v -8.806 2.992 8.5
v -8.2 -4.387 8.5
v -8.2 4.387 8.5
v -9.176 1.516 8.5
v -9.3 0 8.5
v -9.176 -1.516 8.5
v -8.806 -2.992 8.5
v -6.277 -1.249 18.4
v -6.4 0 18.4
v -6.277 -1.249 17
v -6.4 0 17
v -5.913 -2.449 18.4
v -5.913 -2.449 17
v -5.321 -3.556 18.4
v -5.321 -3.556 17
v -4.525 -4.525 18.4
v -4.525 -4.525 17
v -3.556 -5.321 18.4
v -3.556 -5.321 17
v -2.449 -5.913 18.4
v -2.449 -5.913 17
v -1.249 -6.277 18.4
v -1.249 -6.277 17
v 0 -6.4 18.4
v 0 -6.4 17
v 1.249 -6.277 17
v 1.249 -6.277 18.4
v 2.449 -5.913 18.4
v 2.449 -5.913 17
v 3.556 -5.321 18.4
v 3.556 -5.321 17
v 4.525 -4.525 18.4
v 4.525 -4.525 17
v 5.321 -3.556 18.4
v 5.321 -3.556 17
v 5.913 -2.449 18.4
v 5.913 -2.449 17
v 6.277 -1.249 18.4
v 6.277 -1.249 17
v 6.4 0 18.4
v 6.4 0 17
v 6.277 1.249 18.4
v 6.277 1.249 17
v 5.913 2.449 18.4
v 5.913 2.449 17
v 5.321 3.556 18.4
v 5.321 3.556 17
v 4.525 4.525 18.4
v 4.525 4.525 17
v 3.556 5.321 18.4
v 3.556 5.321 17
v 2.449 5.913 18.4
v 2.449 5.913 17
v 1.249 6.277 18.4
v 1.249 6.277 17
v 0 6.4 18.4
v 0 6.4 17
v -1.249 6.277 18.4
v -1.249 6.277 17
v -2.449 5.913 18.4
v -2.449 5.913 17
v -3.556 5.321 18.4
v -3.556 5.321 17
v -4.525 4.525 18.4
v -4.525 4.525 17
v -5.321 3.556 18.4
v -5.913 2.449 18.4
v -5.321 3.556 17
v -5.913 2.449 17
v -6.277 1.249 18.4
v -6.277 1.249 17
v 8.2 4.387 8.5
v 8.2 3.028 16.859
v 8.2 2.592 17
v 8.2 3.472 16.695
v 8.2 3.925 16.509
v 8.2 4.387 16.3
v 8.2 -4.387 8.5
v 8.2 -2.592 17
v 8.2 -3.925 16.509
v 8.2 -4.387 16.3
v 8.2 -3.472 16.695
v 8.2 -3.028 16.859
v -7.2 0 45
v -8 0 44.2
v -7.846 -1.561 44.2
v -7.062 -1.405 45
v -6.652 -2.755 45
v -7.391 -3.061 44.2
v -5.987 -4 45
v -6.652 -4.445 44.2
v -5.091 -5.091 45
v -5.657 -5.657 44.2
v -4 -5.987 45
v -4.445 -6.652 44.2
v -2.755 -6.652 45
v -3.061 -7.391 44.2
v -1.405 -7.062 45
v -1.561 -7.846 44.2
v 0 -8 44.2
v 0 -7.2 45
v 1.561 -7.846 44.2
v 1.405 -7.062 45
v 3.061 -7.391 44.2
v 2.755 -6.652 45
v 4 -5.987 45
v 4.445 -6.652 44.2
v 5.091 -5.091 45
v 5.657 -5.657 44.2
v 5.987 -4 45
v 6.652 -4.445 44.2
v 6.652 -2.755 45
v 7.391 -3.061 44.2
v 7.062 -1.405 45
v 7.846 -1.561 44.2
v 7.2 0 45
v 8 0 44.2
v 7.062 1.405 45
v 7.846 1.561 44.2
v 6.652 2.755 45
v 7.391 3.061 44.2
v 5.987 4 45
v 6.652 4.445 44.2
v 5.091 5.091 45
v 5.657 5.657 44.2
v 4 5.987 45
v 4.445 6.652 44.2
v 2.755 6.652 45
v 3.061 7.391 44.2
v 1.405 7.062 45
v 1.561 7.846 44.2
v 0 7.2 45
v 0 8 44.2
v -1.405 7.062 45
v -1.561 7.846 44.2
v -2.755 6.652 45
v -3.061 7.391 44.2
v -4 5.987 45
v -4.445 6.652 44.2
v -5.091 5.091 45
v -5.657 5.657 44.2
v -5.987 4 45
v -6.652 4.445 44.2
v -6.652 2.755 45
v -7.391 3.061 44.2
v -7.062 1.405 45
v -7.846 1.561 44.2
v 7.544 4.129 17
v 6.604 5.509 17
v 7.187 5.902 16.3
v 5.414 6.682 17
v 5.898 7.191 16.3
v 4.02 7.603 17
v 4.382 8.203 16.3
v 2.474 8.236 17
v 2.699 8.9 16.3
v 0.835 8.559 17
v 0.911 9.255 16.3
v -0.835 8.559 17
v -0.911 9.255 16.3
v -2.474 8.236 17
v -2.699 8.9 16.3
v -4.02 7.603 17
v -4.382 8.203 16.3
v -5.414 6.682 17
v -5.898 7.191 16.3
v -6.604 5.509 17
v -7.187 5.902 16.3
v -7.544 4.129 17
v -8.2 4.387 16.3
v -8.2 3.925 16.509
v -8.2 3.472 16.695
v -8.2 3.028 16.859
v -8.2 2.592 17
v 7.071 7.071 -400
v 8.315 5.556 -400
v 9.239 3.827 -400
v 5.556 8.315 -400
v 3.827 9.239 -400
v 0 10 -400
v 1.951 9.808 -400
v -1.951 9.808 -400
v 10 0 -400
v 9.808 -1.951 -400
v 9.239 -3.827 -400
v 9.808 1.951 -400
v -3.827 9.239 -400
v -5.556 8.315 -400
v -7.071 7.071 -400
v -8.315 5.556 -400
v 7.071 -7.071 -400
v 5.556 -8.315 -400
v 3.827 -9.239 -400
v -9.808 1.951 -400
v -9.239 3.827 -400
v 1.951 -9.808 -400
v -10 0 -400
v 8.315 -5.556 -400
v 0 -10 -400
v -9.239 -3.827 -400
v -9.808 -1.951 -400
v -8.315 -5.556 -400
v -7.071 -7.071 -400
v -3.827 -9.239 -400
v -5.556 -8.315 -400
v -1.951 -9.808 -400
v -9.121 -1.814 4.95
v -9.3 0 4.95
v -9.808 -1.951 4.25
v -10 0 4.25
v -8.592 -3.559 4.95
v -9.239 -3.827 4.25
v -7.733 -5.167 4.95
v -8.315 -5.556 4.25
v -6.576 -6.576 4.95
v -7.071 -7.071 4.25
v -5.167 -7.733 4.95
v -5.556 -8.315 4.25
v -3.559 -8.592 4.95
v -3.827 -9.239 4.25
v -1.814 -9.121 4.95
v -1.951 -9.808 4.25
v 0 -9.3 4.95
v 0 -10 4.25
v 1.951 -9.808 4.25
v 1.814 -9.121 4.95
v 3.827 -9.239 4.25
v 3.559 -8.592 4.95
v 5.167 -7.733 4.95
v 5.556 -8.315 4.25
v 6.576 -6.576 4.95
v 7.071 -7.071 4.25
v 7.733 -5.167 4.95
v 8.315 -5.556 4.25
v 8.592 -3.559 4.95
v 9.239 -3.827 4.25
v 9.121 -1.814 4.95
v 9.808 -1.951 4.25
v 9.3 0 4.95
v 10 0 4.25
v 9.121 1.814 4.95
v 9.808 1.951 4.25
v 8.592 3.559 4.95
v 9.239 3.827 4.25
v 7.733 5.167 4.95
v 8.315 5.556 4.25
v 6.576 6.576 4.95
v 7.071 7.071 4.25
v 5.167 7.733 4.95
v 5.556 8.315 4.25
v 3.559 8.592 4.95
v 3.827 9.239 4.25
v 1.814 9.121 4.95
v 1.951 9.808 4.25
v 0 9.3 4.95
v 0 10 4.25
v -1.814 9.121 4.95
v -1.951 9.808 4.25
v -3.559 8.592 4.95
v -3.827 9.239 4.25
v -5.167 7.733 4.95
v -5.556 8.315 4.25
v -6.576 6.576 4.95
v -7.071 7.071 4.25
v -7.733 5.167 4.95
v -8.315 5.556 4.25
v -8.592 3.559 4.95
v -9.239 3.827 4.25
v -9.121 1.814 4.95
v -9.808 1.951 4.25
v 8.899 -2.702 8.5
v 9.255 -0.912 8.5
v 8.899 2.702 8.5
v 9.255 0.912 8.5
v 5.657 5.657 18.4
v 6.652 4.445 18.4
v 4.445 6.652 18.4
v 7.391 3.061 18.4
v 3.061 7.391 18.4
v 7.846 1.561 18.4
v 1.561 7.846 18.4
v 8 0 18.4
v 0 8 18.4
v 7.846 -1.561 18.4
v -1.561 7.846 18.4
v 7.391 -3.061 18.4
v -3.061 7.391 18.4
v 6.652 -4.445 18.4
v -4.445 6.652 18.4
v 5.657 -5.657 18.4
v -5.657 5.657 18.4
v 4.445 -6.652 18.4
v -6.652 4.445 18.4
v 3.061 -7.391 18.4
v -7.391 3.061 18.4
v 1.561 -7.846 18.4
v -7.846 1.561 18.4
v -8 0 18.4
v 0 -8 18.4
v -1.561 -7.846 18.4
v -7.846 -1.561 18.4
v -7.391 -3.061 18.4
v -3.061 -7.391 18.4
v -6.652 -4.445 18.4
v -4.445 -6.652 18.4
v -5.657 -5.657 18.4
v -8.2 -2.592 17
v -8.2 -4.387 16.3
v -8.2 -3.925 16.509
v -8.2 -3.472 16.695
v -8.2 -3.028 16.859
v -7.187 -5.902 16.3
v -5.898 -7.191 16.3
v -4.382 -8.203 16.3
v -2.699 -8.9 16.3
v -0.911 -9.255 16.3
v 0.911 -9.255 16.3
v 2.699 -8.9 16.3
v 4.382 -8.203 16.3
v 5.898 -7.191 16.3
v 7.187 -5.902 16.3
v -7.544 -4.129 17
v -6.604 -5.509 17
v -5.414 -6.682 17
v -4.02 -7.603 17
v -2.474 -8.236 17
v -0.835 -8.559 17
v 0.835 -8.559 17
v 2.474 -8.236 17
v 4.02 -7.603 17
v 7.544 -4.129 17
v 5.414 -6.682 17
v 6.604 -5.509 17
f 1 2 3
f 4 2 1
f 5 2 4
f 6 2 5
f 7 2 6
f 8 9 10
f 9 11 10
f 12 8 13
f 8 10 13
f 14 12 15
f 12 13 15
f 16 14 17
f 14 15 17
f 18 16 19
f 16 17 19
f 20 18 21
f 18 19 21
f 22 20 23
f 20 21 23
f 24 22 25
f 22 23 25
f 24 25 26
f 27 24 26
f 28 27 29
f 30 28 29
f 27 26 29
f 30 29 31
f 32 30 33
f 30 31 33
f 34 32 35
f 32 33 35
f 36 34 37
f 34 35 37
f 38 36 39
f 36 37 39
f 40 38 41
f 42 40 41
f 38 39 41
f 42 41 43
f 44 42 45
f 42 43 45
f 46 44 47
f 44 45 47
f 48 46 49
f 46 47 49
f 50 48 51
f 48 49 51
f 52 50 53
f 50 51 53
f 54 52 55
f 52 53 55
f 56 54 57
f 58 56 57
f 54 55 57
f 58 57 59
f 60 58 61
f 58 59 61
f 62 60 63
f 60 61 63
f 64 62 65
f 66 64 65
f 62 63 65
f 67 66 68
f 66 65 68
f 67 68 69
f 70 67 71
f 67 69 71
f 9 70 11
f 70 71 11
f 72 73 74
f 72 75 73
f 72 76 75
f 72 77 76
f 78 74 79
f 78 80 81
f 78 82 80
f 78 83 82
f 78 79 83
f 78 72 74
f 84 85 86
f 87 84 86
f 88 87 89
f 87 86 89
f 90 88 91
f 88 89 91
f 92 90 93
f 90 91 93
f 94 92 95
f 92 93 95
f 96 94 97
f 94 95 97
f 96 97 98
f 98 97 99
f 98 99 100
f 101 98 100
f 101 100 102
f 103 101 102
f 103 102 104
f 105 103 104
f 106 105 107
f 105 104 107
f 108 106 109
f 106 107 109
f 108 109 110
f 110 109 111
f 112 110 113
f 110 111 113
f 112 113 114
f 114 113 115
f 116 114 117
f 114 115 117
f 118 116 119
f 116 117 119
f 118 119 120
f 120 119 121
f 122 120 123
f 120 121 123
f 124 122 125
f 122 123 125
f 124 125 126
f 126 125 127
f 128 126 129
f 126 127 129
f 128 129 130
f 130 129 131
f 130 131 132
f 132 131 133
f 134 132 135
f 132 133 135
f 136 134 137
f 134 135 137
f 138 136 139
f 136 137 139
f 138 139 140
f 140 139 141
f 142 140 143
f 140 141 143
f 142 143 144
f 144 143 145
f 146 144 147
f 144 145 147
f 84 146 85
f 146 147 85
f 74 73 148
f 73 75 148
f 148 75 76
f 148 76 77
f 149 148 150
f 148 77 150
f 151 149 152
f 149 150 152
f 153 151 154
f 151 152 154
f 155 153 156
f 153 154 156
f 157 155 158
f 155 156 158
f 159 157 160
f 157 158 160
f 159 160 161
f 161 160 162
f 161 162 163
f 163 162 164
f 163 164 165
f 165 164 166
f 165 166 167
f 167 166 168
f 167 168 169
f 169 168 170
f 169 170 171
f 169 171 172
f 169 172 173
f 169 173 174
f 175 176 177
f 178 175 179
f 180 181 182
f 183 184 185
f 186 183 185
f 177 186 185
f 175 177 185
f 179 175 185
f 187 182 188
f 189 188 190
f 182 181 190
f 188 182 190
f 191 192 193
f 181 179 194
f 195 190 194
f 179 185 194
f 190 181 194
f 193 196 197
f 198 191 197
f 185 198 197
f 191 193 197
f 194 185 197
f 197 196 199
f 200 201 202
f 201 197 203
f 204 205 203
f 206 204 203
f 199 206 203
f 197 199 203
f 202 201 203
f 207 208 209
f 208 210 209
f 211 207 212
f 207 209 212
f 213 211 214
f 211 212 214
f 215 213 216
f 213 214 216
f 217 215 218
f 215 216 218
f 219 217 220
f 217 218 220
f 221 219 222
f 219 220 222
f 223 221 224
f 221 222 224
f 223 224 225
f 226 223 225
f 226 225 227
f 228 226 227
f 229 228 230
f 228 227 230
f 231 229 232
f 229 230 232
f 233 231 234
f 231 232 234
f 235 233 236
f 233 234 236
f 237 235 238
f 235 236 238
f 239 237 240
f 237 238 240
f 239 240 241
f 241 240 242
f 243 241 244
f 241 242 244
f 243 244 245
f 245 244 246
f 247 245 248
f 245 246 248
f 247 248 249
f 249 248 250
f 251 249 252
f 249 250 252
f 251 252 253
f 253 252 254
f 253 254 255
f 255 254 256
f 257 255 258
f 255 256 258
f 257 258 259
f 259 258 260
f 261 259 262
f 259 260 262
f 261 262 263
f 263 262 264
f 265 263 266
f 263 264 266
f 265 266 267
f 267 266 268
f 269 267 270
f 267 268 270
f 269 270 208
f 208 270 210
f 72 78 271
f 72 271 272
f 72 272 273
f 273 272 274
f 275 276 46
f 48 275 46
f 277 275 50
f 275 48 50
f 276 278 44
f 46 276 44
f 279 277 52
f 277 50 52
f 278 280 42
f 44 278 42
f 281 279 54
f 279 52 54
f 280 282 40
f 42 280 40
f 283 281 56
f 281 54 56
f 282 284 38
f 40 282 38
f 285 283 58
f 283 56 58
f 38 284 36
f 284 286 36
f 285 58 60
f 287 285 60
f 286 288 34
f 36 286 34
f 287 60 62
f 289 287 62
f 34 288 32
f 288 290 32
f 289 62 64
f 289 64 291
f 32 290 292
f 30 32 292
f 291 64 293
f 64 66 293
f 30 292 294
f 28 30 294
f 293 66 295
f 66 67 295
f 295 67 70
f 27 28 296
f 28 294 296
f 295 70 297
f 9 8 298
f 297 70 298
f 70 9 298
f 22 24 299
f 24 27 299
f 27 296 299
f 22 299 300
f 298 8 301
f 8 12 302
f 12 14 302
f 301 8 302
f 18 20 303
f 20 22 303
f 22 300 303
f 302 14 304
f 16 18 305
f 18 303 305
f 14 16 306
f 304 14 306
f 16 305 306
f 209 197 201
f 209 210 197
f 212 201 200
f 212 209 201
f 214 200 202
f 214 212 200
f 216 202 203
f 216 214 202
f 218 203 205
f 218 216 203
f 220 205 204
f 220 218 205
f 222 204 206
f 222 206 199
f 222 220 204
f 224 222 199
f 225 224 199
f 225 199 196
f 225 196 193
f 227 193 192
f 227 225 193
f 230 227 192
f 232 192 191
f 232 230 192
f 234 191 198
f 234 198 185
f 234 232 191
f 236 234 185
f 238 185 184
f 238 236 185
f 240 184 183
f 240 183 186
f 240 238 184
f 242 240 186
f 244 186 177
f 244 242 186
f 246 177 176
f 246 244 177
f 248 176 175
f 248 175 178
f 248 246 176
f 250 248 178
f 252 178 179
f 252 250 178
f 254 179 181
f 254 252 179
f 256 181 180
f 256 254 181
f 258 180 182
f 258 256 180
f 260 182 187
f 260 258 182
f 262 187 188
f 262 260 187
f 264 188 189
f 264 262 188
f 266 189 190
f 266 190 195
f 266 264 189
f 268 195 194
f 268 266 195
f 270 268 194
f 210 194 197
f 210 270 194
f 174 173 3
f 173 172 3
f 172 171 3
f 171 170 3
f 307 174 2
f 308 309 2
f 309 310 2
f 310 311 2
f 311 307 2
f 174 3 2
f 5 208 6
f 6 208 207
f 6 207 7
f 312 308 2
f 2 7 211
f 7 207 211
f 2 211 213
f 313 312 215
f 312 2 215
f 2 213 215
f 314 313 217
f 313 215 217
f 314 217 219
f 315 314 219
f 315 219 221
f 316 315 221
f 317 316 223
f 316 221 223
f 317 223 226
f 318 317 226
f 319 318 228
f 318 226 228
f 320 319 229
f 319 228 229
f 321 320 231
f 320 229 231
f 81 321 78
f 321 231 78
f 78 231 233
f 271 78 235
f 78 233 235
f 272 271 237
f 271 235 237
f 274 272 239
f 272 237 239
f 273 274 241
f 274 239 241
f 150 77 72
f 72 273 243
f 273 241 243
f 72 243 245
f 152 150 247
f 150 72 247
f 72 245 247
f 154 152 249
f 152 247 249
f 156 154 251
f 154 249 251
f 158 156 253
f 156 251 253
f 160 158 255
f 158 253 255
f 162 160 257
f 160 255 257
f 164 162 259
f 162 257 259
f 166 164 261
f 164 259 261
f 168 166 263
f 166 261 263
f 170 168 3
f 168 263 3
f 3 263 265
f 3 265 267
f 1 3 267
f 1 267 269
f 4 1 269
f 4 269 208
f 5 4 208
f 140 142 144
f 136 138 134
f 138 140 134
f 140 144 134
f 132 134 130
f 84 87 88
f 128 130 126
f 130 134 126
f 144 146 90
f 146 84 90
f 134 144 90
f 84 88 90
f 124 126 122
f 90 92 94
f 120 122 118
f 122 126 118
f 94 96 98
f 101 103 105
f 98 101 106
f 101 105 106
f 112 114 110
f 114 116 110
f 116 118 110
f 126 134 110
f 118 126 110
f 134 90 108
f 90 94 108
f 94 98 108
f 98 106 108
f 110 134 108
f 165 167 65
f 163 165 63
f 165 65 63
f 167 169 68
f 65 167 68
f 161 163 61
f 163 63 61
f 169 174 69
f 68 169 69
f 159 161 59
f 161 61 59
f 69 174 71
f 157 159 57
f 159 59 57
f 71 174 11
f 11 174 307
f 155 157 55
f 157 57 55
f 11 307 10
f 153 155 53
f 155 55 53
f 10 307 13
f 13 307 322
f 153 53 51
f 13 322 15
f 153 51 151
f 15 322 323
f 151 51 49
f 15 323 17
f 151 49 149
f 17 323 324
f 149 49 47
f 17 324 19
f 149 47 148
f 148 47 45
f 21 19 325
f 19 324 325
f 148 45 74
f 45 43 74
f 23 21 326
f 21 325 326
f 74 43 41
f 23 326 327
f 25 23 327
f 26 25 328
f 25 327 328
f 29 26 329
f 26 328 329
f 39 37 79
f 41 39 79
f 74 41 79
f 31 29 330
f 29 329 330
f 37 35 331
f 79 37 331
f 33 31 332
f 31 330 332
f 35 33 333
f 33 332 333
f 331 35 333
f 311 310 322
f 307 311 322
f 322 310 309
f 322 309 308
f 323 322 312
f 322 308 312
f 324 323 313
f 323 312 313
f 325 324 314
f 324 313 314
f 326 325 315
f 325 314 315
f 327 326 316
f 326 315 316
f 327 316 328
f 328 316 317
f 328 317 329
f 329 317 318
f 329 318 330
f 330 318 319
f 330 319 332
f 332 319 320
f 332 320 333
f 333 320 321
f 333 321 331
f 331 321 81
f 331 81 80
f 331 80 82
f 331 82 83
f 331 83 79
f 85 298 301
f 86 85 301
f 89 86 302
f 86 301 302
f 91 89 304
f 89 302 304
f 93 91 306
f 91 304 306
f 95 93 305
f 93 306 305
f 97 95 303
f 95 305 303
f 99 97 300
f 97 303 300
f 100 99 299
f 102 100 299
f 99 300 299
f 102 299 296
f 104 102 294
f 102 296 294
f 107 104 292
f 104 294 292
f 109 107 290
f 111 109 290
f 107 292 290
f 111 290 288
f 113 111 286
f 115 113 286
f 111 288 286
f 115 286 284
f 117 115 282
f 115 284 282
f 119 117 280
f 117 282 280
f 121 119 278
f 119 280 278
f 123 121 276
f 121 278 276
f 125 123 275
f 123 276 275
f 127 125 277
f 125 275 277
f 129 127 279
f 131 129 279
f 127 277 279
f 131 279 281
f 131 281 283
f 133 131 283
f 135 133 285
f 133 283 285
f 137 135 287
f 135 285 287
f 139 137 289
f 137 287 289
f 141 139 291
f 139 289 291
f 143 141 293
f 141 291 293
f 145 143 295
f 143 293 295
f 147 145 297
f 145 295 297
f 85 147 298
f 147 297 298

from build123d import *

# Parameters (mm, degrees)
CUT_EXTRUDE_START   = -8.5
CUT_EXTRUDE_5_DEPTH = 8.5
CHAMFER_2_SIZE      = 0.8


with BuildPart() as part:
    # 草图16 → 旋转1 (revolve)
    with BuildSketch(Plane(origin=(0, 0, 0), x_dir=(0, 0, -1), z_dir=(1, 0, 0))):
        Polygon((-45, 0), (-45, 8), (-18.4, 8), (-18.4, 6.4), (-17, 6.4), (-17, 8.6), (-16.3, 9.3), (-4.95, 9.3), (-4.25, 10), (0, 10), (400, 10), (400, 0), align=None)
    revolve(axis=Axis((0, 0, -400), (0, 0, 1)))

    # 草图17 → 切除-拉伸5 (cut)
    with BuildSketch(Plane.XY.offset(17).offset(CUT_EXTRUDE_START)):
        with BuildLine():
            Line((8.2, 4.387482194), (8.2, -4.387482194))
            ThreePointArc((8.2, -4.387482194), (9.3, 0), (8.2, 4.387482194))
        make_face()
        with BuildLine():
            Line((-8.2, 4.387482194), (-8.2, -4.387482194))
            ThreePointArc((-8.2, -4.387482194), (-9.3, 0), (-8.2, 4.387482194))
        make_face()
    extrude(amount=CUT_EXTRUDE_5_DEPTH, mode=Mode.SUBTRACT)

    # 倒角2
    chamfer_2_edges = [part.edges().sort_by_distance(p)[0] for p in [
        (0, -8, 45),
    ]]
    chamfer(chamfer_2_edges, length=CHAMFER_2_SIZE)


solid = part.part
